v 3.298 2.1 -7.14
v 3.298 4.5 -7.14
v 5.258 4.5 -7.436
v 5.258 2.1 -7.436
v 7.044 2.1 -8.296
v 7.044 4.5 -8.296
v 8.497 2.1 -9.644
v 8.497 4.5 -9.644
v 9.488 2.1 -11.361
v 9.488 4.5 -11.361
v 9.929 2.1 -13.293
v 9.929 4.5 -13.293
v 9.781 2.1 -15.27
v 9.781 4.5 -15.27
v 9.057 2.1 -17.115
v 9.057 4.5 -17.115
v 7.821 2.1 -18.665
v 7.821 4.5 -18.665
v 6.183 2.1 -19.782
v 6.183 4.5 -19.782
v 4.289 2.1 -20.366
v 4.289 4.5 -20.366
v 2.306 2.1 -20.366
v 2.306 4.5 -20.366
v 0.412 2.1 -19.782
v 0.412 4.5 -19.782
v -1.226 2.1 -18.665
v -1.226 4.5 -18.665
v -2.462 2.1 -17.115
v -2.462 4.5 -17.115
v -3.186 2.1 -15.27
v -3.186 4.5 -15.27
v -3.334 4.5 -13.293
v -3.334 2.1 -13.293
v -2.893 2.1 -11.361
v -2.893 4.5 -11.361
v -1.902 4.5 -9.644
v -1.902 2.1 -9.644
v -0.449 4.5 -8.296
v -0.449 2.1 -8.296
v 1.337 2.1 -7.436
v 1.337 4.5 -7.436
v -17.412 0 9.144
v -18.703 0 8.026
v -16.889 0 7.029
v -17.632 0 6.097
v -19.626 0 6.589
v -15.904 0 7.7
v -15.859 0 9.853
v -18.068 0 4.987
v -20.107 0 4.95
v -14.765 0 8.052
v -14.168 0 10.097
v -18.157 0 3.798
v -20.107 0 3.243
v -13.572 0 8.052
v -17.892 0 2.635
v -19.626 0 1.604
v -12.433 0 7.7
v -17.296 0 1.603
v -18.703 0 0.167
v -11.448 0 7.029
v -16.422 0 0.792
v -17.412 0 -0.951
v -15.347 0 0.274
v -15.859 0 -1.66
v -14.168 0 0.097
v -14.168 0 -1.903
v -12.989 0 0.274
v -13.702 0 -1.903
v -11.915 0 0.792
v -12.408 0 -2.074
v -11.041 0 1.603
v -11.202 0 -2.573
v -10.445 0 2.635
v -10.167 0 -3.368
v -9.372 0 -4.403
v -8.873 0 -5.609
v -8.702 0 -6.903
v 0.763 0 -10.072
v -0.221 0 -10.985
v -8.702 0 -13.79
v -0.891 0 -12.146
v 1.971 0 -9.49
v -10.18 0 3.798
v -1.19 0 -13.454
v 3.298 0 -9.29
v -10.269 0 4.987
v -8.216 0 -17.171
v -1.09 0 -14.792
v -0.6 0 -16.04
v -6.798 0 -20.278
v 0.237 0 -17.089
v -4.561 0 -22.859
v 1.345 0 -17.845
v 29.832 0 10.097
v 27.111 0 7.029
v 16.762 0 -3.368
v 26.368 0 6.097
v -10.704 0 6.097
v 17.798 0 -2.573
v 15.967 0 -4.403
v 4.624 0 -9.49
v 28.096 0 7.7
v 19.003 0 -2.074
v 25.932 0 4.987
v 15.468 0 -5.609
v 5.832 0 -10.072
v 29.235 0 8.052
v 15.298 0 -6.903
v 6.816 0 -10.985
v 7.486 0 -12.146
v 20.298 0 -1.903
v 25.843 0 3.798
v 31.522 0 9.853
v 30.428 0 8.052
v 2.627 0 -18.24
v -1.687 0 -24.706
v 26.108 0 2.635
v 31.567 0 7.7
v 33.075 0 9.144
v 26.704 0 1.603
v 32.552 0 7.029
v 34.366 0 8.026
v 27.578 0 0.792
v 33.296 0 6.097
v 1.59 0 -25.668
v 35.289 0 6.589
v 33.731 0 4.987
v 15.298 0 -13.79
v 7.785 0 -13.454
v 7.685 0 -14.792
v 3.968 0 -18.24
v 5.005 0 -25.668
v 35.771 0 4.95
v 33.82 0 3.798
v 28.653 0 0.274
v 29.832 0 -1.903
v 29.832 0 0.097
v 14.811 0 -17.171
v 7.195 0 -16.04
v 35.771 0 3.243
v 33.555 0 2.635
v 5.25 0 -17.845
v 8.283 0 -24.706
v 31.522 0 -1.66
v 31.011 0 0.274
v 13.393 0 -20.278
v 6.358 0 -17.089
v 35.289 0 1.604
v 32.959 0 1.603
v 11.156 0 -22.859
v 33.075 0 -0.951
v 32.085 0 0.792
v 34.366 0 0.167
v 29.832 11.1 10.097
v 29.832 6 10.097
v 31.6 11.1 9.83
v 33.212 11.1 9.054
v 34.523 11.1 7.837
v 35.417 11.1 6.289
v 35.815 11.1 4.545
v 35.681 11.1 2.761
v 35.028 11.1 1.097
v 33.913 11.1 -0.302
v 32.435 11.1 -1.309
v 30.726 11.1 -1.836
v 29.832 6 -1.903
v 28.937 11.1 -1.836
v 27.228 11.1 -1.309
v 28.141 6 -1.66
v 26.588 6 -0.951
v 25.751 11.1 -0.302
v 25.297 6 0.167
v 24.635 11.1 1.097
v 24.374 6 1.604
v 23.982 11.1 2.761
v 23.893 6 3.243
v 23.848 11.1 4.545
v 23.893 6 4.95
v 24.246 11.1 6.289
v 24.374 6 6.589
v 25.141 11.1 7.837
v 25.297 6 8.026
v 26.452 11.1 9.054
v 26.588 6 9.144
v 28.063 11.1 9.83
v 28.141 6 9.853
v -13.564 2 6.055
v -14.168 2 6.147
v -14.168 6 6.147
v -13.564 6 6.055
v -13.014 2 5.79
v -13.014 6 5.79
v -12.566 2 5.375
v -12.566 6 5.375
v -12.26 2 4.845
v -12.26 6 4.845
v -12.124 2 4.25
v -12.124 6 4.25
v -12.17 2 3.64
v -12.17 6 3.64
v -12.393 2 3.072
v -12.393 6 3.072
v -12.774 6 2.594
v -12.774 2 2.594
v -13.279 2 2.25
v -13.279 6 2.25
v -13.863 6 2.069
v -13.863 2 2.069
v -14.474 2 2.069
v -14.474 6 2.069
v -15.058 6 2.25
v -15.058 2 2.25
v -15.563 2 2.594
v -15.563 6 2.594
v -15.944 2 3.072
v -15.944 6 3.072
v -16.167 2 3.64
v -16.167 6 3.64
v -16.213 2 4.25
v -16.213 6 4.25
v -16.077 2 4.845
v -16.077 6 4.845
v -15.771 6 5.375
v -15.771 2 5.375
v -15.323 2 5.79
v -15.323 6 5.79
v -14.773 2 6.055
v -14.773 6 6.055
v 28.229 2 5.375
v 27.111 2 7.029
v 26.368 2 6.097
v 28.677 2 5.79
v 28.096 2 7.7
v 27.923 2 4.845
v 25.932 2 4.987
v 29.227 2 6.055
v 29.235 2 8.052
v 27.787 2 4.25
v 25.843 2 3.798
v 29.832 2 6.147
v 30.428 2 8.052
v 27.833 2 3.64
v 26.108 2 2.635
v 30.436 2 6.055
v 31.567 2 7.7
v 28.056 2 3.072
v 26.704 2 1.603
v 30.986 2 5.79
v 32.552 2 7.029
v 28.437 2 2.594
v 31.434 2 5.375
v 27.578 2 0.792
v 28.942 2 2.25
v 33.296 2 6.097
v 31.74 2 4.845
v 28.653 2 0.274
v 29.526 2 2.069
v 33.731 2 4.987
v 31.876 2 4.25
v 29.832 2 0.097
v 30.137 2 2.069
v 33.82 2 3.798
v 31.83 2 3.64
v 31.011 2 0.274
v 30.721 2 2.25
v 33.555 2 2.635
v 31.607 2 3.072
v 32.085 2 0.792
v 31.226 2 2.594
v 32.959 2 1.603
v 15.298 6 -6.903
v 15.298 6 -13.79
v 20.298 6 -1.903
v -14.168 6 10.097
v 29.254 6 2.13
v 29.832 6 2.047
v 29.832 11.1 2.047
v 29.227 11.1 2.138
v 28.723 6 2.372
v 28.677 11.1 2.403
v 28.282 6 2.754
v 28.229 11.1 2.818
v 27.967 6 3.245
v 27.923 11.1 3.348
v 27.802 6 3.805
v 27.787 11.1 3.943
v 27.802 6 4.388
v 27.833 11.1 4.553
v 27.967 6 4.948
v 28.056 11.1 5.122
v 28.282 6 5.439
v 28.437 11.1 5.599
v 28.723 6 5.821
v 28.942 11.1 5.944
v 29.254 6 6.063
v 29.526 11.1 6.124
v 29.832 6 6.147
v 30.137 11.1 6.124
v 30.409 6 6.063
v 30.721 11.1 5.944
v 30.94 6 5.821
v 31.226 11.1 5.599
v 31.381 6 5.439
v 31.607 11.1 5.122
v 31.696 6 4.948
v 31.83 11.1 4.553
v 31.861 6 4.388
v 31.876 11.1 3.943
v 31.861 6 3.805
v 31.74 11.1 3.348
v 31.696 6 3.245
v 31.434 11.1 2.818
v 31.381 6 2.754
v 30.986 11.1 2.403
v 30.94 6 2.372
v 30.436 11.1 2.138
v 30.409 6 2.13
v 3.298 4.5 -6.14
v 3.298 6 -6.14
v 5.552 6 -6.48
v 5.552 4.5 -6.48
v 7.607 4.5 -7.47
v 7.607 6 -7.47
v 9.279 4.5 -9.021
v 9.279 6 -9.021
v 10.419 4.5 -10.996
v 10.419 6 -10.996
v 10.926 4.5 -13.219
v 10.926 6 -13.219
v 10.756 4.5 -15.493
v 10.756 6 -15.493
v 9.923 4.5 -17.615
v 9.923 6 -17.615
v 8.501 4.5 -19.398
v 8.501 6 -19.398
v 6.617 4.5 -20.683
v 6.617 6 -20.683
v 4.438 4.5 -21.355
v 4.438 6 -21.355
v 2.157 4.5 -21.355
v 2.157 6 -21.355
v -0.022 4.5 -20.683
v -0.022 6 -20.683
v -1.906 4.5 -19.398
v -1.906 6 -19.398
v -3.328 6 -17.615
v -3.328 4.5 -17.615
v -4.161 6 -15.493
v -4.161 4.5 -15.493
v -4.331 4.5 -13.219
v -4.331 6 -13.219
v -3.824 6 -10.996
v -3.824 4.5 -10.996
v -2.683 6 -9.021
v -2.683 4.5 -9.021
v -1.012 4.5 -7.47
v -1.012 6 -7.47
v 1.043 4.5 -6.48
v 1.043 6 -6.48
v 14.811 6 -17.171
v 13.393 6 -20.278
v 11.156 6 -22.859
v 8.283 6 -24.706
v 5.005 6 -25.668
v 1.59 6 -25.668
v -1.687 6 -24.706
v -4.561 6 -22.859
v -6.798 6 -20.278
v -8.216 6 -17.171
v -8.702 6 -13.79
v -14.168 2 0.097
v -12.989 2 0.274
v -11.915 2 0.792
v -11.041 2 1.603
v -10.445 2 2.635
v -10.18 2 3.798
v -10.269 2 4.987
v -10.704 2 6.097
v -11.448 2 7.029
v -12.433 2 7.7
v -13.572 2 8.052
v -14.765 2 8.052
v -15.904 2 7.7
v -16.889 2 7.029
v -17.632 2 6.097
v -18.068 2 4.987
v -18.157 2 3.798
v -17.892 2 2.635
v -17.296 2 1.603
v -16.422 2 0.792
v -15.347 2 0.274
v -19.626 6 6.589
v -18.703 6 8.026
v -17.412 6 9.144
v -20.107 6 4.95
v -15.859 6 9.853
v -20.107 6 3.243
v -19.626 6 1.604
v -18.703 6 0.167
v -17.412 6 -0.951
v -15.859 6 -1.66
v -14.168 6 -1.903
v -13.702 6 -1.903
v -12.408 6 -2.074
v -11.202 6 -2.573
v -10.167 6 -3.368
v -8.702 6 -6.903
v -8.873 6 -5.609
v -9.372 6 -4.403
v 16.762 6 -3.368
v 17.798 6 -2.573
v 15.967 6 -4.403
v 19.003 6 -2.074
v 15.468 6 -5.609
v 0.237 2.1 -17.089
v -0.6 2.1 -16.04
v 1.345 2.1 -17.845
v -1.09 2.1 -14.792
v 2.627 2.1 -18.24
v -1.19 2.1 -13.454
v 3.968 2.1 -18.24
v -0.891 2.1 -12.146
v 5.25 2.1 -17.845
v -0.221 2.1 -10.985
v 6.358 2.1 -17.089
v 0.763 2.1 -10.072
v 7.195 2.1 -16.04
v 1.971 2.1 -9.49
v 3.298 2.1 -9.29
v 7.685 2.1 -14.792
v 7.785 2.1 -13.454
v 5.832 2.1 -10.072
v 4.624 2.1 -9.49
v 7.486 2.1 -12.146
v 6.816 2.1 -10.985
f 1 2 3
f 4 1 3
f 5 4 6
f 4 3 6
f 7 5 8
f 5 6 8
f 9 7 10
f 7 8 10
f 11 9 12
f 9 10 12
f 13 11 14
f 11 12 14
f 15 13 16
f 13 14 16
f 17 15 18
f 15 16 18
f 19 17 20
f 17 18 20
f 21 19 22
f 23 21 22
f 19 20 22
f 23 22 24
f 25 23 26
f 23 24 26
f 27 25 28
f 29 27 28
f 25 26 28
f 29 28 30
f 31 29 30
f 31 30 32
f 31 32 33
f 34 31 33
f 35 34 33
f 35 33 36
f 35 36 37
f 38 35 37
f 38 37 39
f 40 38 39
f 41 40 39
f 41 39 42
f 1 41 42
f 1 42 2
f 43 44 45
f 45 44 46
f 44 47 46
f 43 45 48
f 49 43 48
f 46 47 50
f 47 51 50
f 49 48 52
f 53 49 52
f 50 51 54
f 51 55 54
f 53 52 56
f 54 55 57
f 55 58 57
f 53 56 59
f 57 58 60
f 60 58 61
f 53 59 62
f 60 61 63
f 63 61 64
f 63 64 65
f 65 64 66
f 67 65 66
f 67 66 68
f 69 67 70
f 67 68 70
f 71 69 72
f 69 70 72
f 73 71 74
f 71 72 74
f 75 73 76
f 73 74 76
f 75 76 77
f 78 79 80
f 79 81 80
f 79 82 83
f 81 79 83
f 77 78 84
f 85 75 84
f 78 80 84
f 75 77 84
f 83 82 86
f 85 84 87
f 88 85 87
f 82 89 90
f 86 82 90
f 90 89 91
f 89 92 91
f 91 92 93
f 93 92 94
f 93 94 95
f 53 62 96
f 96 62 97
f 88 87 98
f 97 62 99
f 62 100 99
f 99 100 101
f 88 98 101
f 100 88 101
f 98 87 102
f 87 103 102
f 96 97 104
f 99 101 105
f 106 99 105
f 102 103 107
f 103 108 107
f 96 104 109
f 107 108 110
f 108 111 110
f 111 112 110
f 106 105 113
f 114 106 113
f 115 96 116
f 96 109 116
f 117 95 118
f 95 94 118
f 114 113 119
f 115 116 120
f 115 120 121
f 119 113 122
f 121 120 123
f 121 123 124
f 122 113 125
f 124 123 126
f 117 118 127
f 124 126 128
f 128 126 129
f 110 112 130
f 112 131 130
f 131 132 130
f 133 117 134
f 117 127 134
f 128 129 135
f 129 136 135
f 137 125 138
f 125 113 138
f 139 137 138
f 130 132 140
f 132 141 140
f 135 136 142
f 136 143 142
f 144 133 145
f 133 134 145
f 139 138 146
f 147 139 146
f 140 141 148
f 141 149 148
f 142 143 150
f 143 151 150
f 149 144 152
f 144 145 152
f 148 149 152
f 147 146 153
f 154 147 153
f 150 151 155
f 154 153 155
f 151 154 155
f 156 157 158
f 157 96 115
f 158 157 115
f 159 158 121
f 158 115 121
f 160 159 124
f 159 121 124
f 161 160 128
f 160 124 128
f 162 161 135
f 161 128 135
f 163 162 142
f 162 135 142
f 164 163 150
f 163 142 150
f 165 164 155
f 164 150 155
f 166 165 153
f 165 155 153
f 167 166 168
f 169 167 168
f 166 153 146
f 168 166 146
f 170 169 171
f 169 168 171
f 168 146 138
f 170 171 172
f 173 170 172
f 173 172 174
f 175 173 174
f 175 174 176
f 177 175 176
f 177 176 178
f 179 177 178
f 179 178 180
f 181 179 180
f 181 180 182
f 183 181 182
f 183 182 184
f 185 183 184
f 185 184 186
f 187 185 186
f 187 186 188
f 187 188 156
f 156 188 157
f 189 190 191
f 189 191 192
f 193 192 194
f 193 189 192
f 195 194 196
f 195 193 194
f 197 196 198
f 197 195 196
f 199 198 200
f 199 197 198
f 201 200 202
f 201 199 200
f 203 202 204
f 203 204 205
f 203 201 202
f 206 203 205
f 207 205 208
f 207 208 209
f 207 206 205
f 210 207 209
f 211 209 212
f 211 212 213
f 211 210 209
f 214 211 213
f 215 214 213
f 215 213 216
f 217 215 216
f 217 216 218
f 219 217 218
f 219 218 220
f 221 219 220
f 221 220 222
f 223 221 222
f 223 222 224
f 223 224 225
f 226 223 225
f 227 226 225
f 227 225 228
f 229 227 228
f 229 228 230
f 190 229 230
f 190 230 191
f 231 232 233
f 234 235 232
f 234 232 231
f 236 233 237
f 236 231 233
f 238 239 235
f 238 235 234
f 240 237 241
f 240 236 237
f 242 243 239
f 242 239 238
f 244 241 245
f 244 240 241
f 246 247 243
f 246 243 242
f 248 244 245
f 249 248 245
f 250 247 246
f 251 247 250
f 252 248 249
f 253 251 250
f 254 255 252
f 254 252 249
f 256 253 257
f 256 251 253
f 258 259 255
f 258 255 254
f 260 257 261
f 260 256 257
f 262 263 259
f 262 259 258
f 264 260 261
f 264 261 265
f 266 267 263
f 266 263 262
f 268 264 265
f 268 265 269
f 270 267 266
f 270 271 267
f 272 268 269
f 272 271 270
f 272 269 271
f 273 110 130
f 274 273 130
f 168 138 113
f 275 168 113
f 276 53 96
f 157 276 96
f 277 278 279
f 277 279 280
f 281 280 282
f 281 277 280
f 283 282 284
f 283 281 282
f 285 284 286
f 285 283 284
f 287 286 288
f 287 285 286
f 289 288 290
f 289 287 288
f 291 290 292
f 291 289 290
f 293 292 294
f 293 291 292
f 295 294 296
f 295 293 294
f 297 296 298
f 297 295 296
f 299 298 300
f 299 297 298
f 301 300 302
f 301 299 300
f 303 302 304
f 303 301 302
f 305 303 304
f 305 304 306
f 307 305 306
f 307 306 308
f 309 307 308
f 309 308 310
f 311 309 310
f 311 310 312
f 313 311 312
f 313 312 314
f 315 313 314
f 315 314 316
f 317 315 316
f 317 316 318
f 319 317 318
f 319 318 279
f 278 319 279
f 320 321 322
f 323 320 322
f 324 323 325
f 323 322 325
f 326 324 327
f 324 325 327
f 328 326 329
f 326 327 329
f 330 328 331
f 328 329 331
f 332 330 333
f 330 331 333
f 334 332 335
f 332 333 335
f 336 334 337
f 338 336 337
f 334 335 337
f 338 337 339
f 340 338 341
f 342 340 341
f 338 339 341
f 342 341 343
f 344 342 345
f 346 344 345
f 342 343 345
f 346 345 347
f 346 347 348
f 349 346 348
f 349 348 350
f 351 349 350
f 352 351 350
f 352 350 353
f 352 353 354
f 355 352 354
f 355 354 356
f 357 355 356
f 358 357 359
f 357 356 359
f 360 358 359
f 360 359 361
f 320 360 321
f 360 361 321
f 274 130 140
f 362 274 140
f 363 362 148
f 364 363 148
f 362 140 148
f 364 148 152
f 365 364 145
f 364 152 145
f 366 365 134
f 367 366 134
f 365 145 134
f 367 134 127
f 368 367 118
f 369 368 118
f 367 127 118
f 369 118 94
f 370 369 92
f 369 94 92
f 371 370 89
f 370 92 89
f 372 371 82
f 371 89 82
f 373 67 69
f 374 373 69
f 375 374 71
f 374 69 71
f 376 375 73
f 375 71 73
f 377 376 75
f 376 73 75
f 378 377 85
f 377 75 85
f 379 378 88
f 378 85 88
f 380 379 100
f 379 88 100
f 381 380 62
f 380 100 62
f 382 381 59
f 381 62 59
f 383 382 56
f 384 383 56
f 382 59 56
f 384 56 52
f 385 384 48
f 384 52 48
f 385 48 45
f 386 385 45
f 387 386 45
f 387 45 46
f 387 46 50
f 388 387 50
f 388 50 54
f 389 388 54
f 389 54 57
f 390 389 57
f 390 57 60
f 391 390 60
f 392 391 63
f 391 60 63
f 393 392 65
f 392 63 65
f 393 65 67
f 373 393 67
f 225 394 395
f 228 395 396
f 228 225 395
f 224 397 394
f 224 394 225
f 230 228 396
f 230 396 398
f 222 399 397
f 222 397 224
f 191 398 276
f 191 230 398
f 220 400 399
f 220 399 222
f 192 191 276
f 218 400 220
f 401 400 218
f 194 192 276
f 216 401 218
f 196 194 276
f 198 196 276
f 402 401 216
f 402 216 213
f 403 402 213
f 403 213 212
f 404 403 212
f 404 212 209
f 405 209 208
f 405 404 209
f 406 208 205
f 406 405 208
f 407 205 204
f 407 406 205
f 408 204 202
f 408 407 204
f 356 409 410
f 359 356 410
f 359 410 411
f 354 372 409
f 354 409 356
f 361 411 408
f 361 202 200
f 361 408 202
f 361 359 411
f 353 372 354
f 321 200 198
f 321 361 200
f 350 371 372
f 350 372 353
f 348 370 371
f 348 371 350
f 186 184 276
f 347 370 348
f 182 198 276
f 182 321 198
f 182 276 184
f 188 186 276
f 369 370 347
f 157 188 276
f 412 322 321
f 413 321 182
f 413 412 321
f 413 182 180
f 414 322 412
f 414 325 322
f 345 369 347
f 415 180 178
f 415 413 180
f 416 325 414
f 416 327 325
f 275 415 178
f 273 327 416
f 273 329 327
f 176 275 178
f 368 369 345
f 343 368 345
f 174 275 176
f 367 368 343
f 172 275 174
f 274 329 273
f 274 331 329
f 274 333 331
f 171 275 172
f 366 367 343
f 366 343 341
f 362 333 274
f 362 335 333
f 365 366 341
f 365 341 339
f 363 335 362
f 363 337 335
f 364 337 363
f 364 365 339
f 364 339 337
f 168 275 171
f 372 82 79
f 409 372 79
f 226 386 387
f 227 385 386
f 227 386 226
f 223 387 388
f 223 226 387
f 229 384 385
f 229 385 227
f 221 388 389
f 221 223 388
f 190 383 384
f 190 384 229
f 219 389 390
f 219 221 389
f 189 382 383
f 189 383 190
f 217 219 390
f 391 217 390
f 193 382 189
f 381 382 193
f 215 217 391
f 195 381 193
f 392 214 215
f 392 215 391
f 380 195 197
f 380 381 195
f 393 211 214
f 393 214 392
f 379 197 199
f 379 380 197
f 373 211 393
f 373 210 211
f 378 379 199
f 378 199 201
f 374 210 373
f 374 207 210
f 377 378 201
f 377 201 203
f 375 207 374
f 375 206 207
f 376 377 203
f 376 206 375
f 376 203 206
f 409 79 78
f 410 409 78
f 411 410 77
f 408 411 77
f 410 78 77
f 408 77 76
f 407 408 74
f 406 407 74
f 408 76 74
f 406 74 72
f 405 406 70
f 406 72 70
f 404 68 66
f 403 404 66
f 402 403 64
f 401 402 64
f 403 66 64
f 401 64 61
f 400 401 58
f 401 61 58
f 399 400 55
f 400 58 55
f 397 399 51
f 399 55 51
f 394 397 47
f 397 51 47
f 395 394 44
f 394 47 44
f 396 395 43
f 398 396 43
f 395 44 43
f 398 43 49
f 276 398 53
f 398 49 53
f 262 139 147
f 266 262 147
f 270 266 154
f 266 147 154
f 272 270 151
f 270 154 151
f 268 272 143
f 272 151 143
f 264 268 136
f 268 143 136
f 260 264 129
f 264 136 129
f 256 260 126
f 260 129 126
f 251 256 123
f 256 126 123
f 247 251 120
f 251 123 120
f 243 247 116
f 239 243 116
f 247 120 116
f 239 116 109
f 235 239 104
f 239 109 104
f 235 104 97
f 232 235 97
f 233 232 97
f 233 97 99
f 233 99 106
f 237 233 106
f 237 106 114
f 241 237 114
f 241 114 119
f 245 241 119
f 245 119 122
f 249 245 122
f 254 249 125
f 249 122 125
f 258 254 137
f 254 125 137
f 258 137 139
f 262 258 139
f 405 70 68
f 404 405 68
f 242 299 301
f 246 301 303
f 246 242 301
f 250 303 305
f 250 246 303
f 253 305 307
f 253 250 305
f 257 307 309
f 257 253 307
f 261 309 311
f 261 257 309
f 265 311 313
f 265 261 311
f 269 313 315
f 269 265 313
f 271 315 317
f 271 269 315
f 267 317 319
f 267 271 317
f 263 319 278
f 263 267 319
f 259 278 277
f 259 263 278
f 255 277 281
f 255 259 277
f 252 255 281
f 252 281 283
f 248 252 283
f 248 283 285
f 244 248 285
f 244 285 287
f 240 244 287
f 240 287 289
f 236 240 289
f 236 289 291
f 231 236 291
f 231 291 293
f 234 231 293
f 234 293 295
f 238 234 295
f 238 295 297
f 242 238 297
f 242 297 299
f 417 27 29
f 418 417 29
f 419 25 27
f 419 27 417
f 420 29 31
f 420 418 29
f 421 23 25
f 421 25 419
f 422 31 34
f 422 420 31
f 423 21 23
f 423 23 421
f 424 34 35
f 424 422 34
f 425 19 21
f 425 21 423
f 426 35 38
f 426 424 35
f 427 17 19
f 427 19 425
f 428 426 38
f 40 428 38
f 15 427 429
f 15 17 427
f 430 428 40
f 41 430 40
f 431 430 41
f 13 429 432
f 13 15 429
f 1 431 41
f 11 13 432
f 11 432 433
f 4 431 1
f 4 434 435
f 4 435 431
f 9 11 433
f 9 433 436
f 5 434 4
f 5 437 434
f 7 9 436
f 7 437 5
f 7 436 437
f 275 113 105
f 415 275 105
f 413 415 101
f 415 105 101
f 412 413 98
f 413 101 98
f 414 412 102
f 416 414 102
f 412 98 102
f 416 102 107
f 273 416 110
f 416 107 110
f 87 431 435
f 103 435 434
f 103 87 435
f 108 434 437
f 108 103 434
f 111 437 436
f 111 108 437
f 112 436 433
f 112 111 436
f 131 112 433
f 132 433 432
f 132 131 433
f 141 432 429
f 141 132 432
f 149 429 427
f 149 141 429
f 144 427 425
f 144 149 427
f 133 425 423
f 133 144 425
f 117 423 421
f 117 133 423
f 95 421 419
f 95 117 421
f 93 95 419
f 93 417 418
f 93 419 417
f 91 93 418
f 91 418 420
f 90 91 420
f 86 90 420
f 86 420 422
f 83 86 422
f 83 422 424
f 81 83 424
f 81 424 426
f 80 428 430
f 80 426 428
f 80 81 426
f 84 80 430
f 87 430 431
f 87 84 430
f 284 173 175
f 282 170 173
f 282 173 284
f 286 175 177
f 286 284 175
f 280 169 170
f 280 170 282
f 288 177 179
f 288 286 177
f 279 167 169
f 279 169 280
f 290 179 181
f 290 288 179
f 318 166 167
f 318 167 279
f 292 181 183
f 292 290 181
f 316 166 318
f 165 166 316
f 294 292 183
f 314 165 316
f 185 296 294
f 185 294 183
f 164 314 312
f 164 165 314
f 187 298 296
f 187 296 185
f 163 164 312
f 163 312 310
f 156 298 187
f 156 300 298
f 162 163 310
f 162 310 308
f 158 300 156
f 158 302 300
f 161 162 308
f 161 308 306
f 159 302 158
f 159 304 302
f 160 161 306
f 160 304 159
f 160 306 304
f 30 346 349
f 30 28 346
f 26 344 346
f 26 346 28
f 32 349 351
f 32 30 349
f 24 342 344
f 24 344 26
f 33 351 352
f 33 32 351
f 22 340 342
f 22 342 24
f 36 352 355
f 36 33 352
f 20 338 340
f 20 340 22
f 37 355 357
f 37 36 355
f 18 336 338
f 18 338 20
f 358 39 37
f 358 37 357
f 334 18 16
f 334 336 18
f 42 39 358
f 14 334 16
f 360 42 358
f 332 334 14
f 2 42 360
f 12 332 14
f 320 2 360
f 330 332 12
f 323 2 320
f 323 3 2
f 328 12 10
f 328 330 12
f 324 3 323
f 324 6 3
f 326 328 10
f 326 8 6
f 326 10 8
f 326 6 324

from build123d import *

# Parameters (mm, degrees)
SKETCH_1_R          = 4.5
SKETCH_1_R_2        = 2.05
EXTRUDE_1_DEPTH     = 6
SKETCH_2_R          = 4
CUT_EXTRUDE_1_DEPTH = 2
SKETCH_3_R          = 6.65
CUT_EXTRUDE_2_DEPTH = 3.9
SKETCH_4_R          = 7.65
CUT_EXTRUDE_3_DEPTH = 1.5
SKETCH_5_R          = 6
SKETCH_5_R_2        = 2.05
EXTRUDE_2_DEPTH     = 5.1


with BuildPart() as part:
    # 草图1 → 凸台-拉伸1 (new body)
    with BuildSketch(Plane(origin=(0, 0, 0), x_dir=(1, 0, 0), z_dir=(0, 1, 0))):
        with BuildLine():
            Line((-14.168368772, -10.096516067), (29.831631228, -10.096516067))
            ThreePointArc((29.831631228, -10.096516067), (35.831631228, -4.096516067), (29.831631228, 1.903483933))
            Line((29.831631228, 1.903483933), (20.297540319, 1.903483933))
            ThreePointArc((20.297540319, 1.903483933), (16.762006413, 3.367950028), (15.297540319, 6.903483933))
            Line((15.297540319, 6.903483933), (15.297540319, 13.790407079))
            ThreePointArc((15.297540319, 13.790407079), (3.297540319, 25.790407079), (-8.702459681, 13.790407079))
            Line((-8.702459681, 13.790407079), (-8.702459681, 6.903483933))
            ThreePointArc((-8.702459681, 6.903483933), (-10.166925775, 3.367950028), (-13.702459681, 1.903483933))
            Line((-13.702459681, 1.903483933), (-14.168368772, 1.903483933))
            ThreePointArc((-14.168368772, 1.903483933), (-20.168368772, -4.096516067), (-14.168368772, -10.096516067))
        make_face()
        with Locations(Location((3.297540319, 13.790407079, 0), (0, 0, 270))):
            Circle(SKETCH_1_R, mode=Mode.SUBTRACT)
        with Locations(Location((-14.168368772, -4.096516067, 0), (0, 0, 270))):
            Circle(SKETCH_1_R_2, mode=Mode.SUBTRACT)
        with Locations(Location((29.831631228, -4.096516067, 0), (0, 0, 270))):
            Circle(SKETCH_1_R_2, mode=Mode.SUBTRACT)
    extrude(amount=EXTRUDE_1_DEPTH)

    # 草图2 → 切除-拉伸1 (cut)
    with BuildSketch(Plane.XZ):
        with Locations(Location((-14.168368772, 4.096516067, 0), (0, 0, 270))):
            Circle(SKETCH_2_R)
        with Locations(Location((29.831631228, 4.096516067, 0), (0, 0, 270))):
            Circle(SKETCH_2_R)
    extrude(amount=-CUT_EXTRUDE_1_DEPTH, mode=Mode.SUBTRACT)

    # 草图3 → 切除-拉伸2 (cut)
    with BuildSketch(Plane(origin=(0, 6, 0), x_dir=(1, 0, 0), z_dir=(0, 1, 0))):
        with Locations(Location((3.297540319, 13.790407079, 0), (0, 0, 270))):
            Circle(SKETCH_3_R)
    extrude(amount=-CUT_EXTRUDE_2_DEPTH, mode=Mode.SUBTRACT)

    # 草图4 → 切除-拉伸3 (cut)
    with BuildSketch(Plane(origin=(0, 6, 0), x_dir=(1, 0, 0), z_dir=(0, 1, 0))):
        with Locations(Location((3.297540319, 13.790407079, 0), (0, 0, 270))):
            Circle(SKETCH_4_R)
    extrude(amount=-CUT_EXTRUDE_3_DEPTH, mode=Mode.SUBTRACT)

    # 草图5 → 凸台-拉伸2 (add)
    with BuildSketch(Plane(origin=(0, 6, 0), x_dir=(1, 0, 0), z_dir=(0, 1, 0))):
        with Locations(Location((29.831631228, -4.096516067, 0), (0, 0, 270))):
            Circle(SKETCH_5_R)
        with Locations(Location((29.831631228, -4.096516067, 0), (0, 0, 90))):
            Circle(SKETCH_5_R_2, mode=Mode.SUBTRACT)
    extrude(amount=EXTRUDE_2_DEPTH)


solid = part.part
